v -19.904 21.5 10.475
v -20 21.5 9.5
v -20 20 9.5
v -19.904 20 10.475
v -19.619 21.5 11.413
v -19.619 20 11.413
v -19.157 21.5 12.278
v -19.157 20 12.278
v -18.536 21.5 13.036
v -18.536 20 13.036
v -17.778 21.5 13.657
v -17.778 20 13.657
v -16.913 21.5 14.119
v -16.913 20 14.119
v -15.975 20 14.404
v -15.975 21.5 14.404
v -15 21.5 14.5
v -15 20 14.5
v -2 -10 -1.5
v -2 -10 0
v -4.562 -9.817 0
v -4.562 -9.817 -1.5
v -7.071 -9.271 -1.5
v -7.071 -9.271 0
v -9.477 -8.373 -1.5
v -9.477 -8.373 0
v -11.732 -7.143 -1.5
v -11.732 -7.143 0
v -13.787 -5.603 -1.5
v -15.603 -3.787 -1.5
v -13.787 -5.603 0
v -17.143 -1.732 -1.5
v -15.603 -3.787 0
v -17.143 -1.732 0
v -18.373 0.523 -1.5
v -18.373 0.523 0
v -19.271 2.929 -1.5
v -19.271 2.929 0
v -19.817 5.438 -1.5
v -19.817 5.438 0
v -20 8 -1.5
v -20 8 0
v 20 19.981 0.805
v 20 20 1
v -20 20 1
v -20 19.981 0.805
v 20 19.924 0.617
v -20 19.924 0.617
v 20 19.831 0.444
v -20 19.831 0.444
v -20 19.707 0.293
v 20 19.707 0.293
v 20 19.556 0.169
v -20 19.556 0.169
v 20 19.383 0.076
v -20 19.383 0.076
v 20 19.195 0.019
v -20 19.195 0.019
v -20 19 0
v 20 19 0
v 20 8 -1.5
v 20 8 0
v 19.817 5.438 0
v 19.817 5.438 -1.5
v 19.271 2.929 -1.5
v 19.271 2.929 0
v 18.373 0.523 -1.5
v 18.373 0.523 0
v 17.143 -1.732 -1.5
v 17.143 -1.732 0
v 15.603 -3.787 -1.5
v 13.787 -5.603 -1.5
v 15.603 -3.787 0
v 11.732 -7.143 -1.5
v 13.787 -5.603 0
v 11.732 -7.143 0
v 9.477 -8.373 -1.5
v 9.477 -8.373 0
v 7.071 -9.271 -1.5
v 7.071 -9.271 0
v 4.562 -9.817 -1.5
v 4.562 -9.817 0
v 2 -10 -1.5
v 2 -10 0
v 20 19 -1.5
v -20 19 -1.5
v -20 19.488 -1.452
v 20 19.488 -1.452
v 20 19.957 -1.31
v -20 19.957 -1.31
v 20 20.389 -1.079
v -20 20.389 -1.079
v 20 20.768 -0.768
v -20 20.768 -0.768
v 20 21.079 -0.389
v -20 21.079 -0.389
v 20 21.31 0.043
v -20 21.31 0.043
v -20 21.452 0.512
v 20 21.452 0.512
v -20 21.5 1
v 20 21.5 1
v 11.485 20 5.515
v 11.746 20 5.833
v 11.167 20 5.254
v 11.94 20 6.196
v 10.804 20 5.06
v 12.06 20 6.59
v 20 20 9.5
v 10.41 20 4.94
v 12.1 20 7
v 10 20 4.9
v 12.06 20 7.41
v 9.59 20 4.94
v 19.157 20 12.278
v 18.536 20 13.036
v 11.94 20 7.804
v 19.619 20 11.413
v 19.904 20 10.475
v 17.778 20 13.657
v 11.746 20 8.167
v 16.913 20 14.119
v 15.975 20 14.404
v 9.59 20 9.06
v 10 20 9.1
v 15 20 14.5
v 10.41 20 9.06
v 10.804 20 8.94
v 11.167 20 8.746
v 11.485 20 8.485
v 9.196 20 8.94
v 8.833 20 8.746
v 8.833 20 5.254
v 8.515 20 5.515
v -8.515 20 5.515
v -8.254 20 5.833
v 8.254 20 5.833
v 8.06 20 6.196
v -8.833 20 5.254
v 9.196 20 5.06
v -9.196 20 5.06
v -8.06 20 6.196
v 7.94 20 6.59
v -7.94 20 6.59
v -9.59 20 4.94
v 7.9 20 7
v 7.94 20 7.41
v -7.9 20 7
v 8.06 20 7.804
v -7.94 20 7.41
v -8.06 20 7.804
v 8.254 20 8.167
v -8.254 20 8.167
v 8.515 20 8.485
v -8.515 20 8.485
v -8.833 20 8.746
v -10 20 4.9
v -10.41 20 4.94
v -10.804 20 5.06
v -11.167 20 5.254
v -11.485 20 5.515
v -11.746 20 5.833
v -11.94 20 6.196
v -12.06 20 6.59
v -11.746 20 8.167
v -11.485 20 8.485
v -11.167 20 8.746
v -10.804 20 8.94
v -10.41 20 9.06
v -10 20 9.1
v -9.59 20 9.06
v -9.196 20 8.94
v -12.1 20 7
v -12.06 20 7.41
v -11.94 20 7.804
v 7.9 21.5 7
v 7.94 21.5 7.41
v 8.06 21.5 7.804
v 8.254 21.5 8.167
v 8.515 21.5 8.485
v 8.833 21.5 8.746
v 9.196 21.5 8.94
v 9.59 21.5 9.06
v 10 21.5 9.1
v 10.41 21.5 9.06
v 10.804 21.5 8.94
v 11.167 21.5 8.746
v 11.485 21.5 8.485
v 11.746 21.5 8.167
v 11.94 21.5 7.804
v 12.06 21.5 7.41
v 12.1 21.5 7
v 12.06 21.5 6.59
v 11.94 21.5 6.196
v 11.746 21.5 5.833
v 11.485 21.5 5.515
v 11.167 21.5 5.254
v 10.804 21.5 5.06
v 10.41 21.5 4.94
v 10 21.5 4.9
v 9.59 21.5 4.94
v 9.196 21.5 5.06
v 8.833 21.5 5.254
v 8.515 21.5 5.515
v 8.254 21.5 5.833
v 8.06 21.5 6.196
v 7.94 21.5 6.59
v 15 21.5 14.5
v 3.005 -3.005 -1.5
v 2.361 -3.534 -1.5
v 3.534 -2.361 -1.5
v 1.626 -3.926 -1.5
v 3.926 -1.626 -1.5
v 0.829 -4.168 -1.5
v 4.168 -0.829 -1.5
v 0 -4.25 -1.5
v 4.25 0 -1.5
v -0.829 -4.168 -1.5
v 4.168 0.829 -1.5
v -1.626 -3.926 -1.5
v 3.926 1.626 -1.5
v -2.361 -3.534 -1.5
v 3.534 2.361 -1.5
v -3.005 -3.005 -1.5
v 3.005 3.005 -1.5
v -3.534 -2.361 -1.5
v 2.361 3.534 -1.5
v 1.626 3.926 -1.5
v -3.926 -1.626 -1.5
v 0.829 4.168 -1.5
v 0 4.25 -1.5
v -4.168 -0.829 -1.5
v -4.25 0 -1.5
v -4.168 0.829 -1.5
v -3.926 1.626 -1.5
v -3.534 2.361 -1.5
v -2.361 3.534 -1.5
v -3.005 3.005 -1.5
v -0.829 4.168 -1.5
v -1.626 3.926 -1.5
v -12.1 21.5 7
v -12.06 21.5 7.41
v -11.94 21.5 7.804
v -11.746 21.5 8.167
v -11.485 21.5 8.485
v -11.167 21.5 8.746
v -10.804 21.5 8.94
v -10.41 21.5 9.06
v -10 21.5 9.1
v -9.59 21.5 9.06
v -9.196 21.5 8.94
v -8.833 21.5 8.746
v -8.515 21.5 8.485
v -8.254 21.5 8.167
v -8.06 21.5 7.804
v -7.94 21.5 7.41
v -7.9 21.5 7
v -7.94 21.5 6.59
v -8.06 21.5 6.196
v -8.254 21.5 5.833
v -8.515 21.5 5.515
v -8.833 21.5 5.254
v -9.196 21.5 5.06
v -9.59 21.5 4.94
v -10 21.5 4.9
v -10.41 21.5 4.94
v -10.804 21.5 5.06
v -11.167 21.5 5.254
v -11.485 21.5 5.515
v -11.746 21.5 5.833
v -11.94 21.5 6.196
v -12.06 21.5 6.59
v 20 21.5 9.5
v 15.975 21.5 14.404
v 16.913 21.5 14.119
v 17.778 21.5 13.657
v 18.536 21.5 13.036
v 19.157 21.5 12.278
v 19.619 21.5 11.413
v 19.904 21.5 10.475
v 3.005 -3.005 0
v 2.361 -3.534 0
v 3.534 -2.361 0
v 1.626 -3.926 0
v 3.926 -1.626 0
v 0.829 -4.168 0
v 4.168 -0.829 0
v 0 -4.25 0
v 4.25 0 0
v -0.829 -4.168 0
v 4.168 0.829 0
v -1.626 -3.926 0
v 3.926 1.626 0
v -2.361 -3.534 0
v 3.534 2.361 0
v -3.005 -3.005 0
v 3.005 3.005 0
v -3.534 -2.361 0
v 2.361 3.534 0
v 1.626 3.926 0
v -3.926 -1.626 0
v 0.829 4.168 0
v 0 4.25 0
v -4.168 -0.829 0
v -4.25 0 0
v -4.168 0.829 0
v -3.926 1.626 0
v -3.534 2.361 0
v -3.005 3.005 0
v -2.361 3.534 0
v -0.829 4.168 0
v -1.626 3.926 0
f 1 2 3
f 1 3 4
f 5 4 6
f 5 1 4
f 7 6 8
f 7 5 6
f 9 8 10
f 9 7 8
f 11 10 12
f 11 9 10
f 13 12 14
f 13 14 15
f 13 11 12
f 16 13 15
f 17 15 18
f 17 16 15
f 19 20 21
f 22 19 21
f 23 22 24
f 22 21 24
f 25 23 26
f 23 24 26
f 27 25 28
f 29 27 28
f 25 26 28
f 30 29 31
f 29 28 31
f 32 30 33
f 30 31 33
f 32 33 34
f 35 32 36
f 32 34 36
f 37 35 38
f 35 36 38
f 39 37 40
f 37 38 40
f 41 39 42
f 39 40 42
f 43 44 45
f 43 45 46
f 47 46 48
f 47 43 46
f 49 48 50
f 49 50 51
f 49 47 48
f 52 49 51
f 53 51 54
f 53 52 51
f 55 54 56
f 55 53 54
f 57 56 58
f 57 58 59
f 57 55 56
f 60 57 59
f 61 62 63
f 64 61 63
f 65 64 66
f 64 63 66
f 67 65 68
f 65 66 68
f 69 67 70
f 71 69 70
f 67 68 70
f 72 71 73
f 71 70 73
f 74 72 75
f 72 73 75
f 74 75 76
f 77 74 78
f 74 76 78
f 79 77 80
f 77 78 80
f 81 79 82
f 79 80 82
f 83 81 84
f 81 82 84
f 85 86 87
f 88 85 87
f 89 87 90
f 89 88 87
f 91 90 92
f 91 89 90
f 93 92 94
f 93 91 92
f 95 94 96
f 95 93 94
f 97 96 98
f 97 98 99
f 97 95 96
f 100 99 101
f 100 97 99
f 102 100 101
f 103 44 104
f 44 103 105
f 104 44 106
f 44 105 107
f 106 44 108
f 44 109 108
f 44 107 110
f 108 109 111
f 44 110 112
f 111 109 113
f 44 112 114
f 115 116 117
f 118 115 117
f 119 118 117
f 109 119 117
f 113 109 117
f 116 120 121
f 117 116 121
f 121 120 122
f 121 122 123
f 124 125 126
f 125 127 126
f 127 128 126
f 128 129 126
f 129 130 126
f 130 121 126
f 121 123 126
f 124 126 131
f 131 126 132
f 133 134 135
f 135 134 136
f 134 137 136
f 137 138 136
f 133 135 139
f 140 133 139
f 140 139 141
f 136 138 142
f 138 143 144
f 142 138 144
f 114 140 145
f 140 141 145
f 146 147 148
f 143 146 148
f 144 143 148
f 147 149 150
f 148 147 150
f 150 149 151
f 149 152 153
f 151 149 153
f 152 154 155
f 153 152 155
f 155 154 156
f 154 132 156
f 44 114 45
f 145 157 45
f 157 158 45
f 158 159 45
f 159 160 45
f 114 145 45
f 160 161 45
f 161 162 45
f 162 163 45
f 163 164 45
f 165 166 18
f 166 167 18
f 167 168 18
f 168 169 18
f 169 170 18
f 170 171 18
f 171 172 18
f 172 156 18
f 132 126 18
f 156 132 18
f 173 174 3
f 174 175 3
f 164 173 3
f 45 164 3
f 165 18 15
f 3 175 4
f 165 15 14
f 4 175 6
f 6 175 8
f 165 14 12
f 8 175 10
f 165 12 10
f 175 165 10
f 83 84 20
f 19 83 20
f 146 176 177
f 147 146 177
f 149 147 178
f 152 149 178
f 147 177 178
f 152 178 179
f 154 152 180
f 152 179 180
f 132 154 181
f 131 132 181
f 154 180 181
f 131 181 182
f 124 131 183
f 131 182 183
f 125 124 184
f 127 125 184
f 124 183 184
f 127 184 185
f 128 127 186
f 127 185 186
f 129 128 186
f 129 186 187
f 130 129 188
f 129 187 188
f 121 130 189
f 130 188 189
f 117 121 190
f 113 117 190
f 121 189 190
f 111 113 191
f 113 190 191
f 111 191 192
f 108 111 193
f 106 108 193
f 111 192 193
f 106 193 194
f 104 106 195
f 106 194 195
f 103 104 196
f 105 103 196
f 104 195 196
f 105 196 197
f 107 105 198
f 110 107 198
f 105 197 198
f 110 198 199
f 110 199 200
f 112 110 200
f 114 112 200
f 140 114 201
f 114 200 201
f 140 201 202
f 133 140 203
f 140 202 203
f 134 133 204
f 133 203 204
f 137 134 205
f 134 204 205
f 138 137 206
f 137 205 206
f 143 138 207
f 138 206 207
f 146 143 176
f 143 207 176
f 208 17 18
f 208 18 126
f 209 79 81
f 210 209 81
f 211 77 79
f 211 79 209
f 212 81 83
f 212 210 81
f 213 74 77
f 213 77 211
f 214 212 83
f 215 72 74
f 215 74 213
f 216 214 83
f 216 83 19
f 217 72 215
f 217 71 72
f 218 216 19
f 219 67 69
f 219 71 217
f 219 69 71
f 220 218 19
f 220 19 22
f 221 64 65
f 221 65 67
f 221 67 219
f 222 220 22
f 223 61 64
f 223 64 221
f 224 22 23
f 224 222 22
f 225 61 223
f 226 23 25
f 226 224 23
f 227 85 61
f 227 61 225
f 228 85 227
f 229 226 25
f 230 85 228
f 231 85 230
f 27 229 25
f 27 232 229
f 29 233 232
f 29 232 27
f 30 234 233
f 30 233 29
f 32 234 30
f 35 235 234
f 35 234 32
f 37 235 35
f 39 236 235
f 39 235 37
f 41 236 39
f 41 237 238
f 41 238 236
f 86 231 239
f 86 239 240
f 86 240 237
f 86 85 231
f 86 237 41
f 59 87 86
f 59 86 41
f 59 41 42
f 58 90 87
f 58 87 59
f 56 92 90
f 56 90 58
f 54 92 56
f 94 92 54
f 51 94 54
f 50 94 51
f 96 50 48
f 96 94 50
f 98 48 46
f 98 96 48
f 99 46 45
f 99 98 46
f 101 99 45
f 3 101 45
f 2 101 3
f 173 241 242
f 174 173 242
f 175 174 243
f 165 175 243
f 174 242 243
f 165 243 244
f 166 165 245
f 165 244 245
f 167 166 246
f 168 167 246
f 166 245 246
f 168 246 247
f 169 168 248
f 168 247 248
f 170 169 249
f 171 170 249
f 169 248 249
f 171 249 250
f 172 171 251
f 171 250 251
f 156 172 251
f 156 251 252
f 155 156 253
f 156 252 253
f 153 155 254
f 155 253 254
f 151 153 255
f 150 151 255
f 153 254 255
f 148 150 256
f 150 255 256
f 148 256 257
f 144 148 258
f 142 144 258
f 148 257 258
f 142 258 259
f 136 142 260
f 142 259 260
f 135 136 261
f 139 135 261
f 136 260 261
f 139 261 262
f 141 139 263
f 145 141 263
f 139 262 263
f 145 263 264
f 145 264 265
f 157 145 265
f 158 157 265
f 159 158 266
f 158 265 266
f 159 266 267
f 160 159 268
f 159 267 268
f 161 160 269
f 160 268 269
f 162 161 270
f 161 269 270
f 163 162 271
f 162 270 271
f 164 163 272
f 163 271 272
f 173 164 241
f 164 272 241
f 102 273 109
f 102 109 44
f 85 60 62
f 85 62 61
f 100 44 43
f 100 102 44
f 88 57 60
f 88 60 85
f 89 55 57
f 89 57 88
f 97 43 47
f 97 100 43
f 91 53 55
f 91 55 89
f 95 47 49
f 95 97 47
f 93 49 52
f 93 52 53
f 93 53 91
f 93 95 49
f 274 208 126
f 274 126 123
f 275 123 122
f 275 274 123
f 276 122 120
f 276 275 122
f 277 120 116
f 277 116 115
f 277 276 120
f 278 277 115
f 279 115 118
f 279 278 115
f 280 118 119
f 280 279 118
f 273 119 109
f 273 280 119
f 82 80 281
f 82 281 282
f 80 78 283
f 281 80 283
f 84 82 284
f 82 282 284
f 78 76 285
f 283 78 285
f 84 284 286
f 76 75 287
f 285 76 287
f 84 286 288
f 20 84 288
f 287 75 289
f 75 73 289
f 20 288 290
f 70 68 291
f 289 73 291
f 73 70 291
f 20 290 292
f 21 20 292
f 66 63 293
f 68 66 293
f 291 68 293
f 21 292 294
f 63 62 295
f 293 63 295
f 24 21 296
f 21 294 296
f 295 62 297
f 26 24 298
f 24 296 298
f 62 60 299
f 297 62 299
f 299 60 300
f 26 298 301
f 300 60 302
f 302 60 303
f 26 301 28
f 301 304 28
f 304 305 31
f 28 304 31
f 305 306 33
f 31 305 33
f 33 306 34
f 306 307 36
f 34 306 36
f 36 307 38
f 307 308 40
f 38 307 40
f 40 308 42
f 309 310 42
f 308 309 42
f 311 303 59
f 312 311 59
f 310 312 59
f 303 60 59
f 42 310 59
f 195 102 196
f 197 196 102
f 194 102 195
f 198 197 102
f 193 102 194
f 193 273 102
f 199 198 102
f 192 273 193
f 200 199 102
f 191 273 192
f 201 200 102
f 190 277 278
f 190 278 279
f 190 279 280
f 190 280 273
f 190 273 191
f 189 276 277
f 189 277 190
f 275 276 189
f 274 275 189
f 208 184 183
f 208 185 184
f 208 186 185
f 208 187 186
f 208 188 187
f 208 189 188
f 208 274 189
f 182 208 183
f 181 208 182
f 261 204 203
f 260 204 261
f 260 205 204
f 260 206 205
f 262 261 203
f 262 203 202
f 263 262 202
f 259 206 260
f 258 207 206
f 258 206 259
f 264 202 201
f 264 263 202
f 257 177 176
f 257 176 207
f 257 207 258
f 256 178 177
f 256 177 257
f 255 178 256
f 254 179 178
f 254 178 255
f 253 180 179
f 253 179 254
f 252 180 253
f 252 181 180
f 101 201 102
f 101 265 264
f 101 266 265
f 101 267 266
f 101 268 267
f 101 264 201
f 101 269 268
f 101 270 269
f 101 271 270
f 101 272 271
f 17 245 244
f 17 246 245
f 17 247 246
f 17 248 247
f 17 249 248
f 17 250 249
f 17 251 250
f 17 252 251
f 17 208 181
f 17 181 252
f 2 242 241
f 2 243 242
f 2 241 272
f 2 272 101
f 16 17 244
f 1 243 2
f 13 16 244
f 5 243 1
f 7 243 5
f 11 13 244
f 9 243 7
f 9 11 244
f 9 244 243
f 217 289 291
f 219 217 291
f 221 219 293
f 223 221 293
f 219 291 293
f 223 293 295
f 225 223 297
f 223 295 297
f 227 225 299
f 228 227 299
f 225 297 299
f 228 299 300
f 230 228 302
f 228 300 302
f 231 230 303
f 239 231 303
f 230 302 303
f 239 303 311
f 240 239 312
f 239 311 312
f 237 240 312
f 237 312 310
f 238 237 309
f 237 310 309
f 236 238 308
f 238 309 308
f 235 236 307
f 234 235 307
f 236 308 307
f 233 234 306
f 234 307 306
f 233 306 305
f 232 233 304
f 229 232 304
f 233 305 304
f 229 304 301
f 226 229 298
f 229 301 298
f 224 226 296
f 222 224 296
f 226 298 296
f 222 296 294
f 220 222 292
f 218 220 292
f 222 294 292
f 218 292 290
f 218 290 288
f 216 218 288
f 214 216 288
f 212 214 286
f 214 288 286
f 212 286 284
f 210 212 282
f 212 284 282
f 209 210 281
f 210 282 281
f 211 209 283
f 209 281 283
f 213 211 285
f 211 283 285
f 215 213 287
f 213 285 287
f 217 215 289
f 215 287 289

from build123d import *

# Parameters (mm, degrees)
SKETCH_1_R                       = 4.25
SM_BASE_FLANGE_1_DEPTH           = 1.5
SM_EDGE_FLANGE_1_STRIP_W         = 8
SM_EDGE_FLANGE_1_STRIP_H         = 1.5
SM_EDGE_FLANGE_1_STRIP_CUT_DEPTH = 40
SM_EDGE_FLANGE_1_DEPTH           = 40
SM_EDGE_FLANGE_1_PROFILE_R       = 2.1
SM_EDGE_FLANGE_1_FLAT_DEPTH      = 1.5


# Sheet-metal steps are written as plain solids
with BuildPart() as part:
    # Sketch 1 → 基体-法兰1 (new body)
    with BuildSketch(Plane.XY):
        with BuildLine():
            Line((-20, 21.5), (20, 21.5))
            Line((20, 21.5), (20, 8))
            ThreePointArc((20, 8), (14.727922061, -4.727922061), (2, -10))
            Line((2, -10), (-2, -10))
            ThreePointArc((-2, -10), (-14.727922061, -4.727922061), (-20, 8))
            Line((-20, 8), (-20, 21.5))
        make_face()
        Circle(SKETCH_1_R, mode=Mode.SUBTRACT)
    extrude(amount=-SM_BASE_FLANGE_1_DEPTH)

    # 边线-法兰1 strip (across the edge) → 边线-法兰1 strip cut (cut)
    with BuildSketch(Plane(origin=(20, 21.5, 0), x_dir=(0, -1, 0), z_dir=(-1, 0, 0))):
        with Locations((-1.5, -0.75)):
            Rectangle(SM_EDGE_FLANGE_1_STRIP_W, SM_EDGE_FLANGE_1_STRIP_H)
    extrude(amount=SM_EDGE_FLANGE_1_STRIP_CUT_DEPTH, mode=Mode.SUBTRACT)

    # 边线-法兰1 bend section (across the edge) → 边线-法兰1 (add)
    with BuildSketch(Plane(origin=(20, 21.5, 0), x_dir=(0, -1, 0), z_dir=(-1, 0, 0))):
        with BuildLine():
            Line((0, 1), (1.5, 1))
            ThreePointArc((1.5, 1), (1.792893219, 0.292893219), (2.5, 0))
            Line((2.5, 0), (2.5, -1.5))
            ThreePointArc((2.5, -1.5), (0.732233047, -0.767766953), (0, 1))
        make_face()
    extrude(amount=SM_EDGE_FLANGE_1_DEPTH)

    # 边线-法兰1 profile (on flange) → 边线-法兰1 flat (add)
    with BuildSketch(Plane(origin=(0, 21.5, 0), x_dir=(-1, 0, 0), z_dir=(0, 1, 0))):
        with BuildLine():
            Line((15, 14.5), (-15, 14.5))
            ThreePointArc((-15, 14.5), (-18.535533906, 13.035533906), (-20, 9.5))
            Line((-20, 9.5), (-20, 1))
            Line((-20, 1), (20, 1))
            Line((20, 1), (20, 9.5))
            ThreePointArc((20, 9.5), (18.535533906, 13.035533906), (15, 14.5))
        make_face()
        with Locations((-10, 7)):
            Circle(SM_EDGE_FLANGE_1_PROFILE_R, mode=Mode.SUBTRACT)
        with Locations((10, 7)):
            Circle(SM_EDGE_FLANGE_1_PROFILE_R, mode=Mode.SUBTRACT)
    extrude(amount=-SM_EDGE_FLANGE_1_FLAT_DEPTH)


solid = part.part
